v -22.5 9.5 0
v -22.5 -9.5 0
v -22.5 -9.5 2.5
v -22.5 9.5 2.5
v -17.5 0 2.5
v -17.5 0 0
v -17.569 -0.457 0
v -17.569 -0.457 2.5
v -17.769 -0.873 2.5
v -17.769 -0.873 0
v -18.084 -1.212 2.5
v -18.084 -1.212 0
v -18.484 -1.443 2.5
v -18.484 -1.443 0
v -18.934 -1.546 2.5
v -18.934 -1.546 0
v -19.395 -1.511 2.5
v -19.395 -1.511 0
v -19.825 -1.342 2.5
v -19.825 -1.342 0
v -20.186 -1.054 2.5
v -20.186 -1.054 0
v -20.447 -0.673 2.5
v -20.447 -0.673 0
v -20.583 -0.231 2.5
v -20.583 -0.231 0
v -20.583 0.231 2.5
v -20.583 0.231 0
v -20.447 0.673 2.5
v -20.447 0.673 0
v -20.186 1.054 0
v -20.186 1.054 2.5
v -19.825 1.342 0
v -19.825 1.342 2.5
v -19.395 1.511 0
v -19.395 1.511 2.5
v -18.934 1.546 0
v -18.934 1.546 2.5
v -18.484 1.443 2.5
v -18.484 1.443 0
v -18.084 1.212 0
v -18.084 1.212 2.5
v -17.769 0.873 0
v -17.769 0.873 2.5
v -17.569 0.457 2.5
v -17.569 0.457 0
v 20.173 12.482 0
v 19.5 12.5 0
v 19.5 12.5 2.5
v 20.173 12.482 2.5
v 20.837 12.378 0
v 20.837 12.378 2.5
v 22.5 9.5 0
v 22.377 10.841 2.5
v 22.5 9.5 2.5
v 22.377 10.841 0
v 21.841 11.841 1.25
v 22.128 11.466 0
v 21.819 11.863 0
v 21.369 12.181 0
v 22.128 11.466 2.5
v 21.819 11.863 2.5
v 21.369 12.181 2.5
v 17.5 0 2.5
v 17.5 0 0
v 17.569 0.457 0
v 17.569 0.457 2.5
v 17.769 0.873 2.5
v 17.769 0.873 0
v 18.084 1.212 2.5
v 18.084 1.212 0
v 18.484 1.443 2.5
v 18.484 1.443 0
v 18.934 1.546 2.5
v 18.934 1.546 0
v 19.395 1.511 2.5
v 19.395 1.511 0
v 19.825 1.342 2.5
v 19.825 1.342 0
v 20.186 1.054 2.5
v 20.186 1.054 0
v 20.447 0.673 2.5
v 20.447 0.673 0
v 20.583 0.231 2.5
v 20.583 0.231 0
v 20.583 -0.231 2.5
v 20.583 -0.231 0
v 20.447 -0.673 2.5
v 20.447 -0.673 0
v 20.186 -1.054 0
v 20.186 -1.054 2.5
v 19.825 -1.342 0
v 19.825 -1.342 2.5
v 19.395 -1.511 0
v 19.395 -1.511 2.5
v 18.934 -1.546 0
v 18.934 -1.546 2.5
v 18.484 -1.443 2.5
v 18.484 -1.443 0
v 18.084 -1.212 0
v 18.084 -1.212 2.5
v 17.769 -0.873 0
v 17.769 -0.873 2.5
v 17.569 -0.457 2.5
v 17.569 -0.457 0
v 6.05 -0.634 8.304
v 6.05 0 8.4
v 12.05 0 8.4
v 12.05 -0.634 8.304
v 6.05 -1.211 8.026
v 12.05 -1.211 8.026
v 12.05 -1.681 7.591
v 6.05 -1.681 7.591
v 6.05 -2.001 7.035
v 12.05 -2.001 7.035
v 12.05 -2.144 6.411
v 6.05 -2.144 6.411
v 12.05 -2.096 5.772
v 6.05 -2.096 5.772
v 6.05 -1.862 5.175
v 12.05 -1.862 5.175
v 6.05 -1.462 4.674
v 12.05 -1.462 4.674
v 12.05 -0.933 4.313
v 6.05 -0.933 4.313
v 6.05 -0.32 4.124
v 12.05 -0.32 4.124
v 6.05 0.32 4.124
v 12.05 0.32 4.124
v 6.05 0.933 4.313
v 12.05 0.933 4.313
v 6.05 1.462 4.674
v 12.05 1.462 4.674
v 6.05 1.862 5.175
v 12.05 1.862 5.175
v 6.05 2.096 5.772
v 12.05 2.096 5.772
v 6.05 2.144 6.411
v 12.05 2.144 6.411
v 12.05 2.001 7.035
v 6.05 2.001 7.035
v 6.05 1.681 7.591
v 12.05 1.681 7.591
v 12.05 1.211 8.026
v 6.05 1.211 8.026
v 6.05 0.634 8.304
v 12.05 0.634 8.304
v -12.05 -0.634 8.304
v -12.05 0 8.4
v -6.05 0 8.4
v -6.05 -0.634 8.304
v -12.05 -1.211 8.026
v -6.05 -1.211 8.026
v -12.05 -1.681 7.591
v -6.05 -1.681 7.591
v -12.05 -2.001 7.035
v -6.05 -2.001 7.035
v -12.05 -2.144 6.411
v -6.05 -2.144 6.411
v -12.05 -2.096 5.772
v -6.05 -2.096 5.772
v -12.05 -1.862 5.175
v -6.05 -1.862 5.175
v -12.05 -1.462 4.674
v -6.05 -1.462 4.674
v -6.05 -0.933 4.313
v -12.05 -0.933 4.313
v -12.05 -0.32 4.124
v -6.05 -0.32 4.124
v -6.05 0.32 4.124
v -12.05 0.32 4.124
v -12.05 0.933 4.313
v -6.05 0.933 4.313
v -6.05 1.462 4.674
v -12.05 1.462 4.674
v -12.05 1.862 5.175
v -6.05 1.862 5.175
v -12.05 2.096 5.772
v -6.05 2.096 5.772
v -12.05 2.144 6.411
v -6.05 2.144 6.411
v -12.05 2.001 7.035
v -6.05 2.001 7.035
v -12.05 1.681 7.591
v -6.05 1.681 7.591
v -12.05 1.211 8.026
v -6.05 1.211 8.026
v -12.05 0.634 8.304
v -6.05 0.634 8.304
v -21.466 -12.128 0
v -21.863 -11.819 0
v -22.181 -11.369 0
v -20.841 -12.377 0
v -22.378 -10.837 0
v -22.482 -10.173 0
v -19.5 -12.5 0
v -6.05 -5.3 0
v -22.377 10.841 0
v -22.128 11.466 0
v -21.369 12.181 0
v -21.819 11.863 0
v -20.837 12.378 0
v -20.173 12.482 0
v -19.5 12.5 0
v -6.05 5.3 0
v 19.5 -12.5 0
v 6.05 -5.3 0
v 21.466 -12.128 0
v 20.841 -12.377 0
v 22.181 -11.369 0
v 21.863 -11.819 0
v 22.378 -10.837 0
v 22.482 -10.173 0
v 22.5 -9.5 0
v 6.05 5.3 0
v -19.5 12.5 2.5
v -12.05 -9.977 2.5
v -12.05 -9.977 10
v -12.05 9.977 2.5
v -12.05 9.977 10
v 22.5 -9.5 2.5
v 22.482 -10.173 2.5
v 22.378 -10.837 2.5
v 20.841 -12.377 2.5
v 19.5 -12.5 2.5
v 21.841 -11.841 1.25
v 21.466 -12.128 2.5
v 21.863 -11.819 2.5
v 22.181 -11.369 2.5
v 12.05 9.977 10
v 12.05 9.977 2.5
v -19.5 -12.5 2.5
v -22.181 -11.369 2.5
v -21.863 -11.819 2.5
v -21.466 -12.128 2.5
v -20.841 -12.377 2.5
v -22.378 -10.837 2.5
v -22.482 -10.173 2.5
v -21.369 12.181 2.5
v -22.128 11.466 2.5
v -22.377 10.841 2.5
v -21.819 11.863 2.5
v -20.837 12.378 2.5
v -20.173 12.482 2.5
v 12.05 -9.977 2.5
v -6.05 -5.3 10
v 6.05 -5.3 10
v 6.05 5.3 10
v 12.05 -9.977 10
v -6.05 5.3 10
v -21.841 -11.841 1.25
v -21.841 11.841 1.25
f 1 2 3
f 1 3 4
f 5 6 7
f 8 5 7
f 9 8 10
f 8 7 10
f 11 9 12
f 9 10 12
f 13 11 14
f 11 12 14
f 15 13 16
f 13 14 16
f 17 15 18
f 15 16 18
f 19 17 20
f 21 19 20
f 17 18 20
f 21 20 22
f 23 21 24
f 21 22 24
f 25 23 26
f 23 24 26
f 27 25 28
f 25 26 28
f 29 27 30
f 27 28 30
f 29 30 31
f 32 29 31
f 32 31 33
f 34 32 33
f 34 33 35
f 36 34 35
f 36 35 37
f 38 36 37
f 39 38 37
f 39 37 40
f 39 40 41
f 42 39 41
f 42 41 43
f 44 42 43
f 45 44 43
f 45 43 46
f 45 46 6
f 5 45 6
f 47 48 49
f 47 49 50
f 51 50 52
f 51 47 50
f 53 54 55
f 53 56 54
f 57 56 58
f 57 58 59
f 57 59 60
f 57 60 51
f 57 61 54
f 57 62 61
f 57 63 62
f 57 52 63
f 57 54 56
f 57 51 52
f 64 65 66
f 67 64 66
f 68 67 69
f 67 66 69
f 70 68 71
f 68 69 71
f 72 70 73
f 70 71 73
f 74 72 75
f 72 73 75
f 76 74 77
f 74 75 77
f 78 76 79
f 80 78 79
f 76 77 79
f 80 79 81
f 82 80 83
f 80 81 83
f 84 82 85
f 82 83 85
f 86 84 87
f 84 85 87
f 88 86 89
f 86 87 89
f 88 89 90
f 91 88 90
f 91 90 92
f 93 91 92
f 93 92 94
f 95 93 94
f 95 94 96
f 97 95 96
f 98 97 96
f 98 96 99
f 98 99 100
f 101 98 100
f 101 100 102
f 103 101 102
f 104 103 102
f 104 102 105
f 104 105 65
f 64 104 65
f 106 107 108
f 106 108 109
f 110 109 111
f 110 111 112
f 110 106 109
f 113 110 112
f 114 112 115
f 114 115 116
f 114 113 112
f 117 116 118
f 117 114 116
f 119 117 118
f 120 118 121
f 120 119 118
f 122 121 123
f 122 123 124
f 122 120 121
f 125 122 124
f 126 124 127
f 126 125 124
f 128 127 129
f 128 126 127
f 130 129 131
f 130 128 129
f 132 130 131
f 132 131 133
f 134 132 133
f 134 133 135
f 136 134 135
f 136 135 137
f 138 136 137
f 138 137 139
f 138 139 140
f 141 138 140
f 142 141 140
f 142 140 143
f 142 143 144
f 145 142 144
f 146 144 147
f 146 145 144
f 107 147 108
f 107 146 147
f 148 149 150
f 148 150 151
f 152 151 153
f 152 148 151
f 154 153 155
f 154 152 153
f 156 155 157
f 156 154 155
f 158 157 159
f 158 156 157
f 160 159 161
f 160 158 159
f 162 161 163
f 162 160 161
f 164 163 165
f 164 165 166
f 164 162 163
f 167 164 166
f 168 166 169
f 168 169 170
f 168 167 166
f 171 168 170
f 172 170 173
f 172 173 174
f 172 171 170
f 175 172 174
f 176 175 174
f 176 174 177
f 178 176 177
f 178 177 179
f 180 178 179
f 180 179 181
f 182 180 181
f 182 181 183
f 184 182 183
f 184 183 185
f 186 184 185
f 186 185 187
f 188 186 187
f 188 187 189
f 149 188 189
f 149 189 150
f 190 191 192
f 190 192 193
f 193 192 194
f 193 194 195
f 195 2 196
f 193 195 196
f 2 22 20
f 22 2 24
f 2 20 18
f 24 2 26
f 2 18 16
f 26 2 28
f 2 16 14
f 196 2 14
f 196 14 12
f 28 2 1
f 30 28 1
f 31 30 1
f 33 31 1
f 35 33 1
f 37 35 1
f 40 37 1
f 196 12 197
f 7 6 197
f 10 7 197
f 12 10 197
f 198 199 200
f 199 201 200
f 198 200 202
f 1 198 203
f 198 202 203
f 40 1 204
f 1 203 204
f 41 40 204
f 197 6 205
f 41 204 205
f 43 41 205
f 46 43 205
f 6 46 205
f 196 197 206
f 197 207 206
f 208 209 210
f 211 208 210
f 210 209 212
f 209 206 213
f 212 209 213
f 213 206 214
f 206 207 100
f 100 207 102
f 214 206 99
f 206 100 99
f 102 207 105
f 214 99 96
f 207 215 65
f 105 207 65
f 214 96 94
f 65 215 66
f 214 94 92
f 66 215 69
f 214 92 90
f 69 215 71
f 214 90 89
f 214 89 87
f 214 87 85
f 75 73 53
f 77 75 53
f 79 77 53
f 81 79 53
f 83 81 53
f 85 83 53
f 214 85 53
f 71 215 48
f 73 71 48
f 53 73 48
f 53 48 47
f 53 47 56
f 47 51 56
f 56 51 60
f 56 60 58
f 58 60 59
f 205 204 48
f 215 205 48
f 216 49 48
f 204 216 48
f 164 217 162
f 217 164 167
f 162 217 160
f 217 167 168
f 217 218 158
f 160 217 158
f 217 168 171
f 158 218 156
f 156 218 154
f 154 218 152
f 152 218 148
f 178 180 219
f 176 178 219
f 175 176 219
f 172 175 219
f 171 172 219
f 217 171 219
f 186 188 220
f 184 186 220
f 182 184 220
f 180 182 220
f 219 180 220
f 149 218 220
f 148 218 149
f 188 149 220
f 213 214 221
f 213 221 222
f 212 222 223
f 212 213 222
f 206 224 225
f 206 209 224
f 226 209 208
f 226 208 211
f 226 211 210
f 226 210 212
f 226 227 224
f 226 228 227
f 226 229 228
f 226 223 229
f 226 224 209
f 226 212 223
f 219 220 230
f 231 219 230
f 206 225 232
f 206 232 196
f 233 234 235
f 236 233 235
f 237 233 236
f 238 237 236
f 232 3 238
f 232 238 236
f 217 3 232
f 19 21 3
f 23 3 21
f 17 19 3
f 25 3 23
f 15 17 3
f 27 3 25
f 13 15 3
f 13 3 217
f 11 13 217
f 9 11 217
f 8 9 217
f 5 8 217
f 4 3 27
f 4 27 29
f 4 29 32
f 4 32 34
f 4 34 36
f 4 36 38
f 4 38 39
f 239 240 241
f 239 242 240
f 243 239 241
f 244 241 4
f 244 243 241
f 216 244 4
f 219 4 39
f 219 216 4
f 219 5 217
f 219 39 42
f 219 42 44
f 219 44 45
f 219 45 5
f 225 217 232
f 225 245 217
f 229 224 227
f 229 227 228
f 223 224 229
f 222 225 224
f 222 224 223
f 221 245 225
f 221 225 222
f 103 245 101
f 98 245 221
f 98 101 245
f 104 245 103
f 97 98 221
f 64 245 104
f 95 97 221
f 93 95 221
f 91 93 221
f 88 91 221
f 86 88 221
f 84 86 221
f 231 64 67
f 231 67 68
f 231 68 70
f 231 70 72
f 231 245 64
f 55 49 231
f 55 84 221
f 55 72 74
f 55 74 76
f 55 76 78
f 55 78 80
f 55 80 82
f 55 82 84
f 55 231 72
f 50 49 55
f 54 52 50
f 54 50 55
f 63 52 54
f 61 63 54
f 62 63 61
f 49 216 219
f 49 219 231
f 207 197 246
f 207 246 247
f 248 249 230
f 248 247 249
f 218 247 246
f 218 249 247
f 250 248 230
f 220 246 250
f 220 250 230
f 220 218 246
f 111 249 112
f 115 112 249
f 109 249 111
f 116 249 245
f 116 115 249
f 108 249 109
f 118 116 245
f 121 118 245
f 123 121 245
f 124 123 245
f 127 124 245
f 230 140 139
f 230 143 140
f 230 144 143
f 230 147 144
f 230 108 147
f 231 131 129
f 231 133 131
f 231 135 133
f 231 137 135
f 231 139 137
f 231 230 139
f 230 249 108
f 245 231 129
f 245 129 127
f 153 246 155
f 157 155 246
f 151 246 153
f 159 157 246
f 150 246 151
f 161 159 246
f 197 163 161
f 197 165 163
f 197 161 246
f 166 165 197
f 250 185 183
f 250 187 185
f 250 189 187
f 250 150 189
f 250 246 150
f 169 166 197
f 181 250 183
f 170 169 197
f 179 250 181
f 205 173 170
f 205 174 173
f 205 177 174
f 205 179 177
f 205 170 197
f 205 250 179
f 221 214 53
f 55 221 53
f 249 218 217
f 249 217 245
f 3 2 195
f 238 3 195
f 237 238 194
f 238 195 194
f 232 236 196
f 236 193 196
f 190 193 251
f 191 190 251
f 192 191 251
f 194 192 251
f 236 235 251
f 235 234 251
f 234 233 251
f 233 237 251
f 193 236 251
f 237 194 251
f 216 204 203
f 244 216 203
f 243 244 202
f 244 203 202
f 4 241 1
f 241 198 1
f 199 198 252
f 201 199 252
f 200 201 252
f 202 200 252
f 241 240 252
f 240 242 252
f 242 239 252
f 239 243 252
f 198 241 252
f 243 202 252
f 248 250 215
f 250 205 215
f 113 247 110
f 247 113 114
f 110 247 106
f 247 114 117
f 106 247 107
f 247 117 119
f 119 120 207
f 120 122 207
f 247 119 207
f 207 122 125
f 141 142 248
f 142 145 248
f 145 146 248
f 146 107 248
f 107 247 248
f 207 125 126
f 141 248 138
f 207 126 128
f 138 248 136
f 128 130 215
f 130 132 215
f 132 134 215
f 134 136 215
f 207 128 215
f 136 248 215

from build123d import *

# Parameters (mm, degrees)
SKETCH1_W           = 45
SKETCH1_H           = 25
SKETCH1_W_2         = 12.1
SKETCH1_H_2         = 10.6
BOSS_EXTRUDE1_DEPTH = 2.5
SKETCH2_W           = 12.1
SKETCH2_H           = 7.2
BOSS_EXTRUDE2_DEPTH = 7.5
BOSS_EXTRUDE3_START = 6.05
SKETCH3_W           = 7.5
SKETCH3_H           = 25
SKETCH3_R           = 2.15
BOSS_EXTRUDE3_DEPTH = 6
BOSS_EXTRUDE4_START = -14.05
SKETCH3_2_W         = 7.5
SKETCH3_2_H         = 25
SKETCH3_2_R         = 2.15
BOSS_EXTRUDE4_DEPTH = 8
SKETCH5_R           = 1.55
CUT_EXTRUDE1_DEPTH  = 10
FILLET1_SIZE        = 3
SKETCH6_OUTSIDE_W   = 57.488
SKETCH6_OUTSIDE_H   = 37.488
SKETCH6_OUTSIDE_W_2 = 24.1
SKETCH6_OUTSIDE_H_2 = 19.953815678
CUT_EXTRUDE2_DEPTH  = 7.5


with BuildPart() as part:
    # Sketch1 → Boss-Extrude1 (new body)
    with BuildSketch(Plane.XY):
        Rectangle(SKETCH1_W, SKETCH1_H)
        Rectangle(SKETCH1_W_2, SKETCH1_H_2, mode=Mode.SUBTRACT)
    extrude(amount=BOSS_EXTRUDE1_DEPTH)

    # Sketch2 → Boss-Extrude2 (add)
    with BuildSketch(Plane.XY.offset(2.5)):
        with Locations((0, -8.9)):
            Rectangle(SKETCH2_W, SKETCH2_H)
        with Locations((0, 8.9)):
            Rectangle(SKETCH2_W, SKETCH2_H)
    extrude(amount=BOSS_EXTRUDE2_DEPTH)

    # Sketch3 → Boss-Extrude3 (add)
    with BuildSketch(Plane(origin=(0, 0, 0), x_dir=(0, 0, -1), z_dir=(1, 0, 0)).offset(BOSS_EXTRUDE3_START)):
        with Locations((-6.25, 0)):
            Rectangle(SKETCH3_W, SKETCH3_H)
        with Locations(Location((-6.25, 0, 0), (0, 0, 180))):
            Circle(SKETCH3_R, mode=Mode.SUBTRACT)
    extrude(amount=BOSS_EXTRUDE3_DEPTH)

    # Sketch3<2> → Boss-Extrude4 (add)
    with BuildSketch(Plane(origin=(0, 0, 0), x_dir=(0, 0, -1), z_dir=(1, 0, 0)).offset(BOSS_EXTRUDE4_START)):
        with Locations((-6.25, 0)):
            Rectangle(SKETCH3_2_W, SKETCH3_2_H)
        with Locations(Location((-6.25, 0, 0), (0, 0, 180))):
            Circle(SKETCH3_2_R, mode=Mode.SUBTRACT)
    extrude(amount=BOSS_EXTRUDE4_DEPTH)

    # Sketch5 → Cut-Extrude1 (cut)
    with BuildSketch(Plane(origin=(0, 0, 0), x_dir=(-1, 0, 0), z_dir=(0, 0, -1))):
        with Locations((-19.05, 0)):
            Circle(SKETCH5_R)
        with Locations(Location((19.05, 0, 0), (0, 0, 180))):
            Circle(SKETCH5_R)
    extrude(amount=-CUT_EXTRUDE1_DEPTH, mode=Mode.SUBTRACT)

    # Fillet1
    # a fillet whose section is not a circle: 3 mm, written as the material it takes off along each edge
    with BuildSketch(Plane(origin=(-22.5, -12.5, -7.5), x_dir=(0, 1, 0), z_dir=(0, 0, 1)), Plane(origin=(-22.5, 12.5, -7.5), x_dir=(1, 0, 0), z_dir=(0, 0, 1))) as fillet1_piece_1:
        with BuildLine():
            add(Edge.make_bspline([(FILLET1_SIZE, 0), (FILLET1_SIZE * 0.831801948466, 0), (FILLET1_SIZE * 0.663603896932, 0), (FILLET1_SIZE * 0.292893218813, -FILLET1_SIZE * 0.0716919198361), (FILLET1_SIZE * 0.0716919198361, -FILLET1_SIZE * 0.292893218813), (0, -FILLET1_SIZE * 0.663603896932), (0, -FILLET1_SIZE * 0.831801948466), (0, -FILLET1_SIZE)], knots=[0, 0, 0, 0, 0, 0, 0.5, 0.5, 1, 1, 1, 1, 1, 1], degree=5))
            Line((0, -FILLET1_SIZE), (0, 0))
            Line((0, 0), (FILLET1_SIZE, 0))
        make_face()
    extrude(amount=17.5, mode=Mode.SUBTRACT)
    with BuildSketch(Plane(origin=(22.5, -12.5, -7.5), x_dir=(0, 1, 0), z_dir=(0, 0, 1)), Plane(origin=(22.5, 12.5, -7.5), x_dir=(-1, 0, 0), z_dir=(0, 0, 1))) as fillet1_piece_2:
        with BuildLine():
            add(Edge.make_bspline([(FILLET1_SIZE, 0), (FILLET1_SIZE * 0.831801948466, 0), (FILLET1_SIZE * 0.663603896932, 0), (FILLET1_SIZE * 0.292893218813, FILLET1_SIZE * 0.0716919198361), (FILLET1_SIZE * 0.0716919198361, FILLET1_SIZE * 0.292893218813), (0, FILLET1_SIZE * 0.663603896932), (0, FILLET1_SIZE * 0.831801948466), (0, FILLET1_SIZE)], knots=[0, 0, 0, 0, 0, 0, 0.5, 0.5, 1, 1, 1, 1, 1, 1], degree=5))
            Line((0, FILLET1_SIZE), (0, 0))
            Line((0, 0), (FILLET1_SIZE, 0))
        make_face()
    extrude(amount=17.5, mode=Mode.SUBTRACT)

    # Sketch6 outside → Cut-Extrude2 (cut)
    with BuildSketch(Plane.XY.offset(10)):
        Rectangle(SKETCH6_OUTSIDE_W, SKETCH6_OUTSIDE_H)
        Rectangle(SKETCH6_OUTSIDE_W_2, SKETCH6_OUTSIDE_H_2, mode=Mode.SUBTRACT)
    extrude(amount=-CUT_EXTRUDE2_DEPTH, mode=Mode.SUBTRACT)


solid = part.part
